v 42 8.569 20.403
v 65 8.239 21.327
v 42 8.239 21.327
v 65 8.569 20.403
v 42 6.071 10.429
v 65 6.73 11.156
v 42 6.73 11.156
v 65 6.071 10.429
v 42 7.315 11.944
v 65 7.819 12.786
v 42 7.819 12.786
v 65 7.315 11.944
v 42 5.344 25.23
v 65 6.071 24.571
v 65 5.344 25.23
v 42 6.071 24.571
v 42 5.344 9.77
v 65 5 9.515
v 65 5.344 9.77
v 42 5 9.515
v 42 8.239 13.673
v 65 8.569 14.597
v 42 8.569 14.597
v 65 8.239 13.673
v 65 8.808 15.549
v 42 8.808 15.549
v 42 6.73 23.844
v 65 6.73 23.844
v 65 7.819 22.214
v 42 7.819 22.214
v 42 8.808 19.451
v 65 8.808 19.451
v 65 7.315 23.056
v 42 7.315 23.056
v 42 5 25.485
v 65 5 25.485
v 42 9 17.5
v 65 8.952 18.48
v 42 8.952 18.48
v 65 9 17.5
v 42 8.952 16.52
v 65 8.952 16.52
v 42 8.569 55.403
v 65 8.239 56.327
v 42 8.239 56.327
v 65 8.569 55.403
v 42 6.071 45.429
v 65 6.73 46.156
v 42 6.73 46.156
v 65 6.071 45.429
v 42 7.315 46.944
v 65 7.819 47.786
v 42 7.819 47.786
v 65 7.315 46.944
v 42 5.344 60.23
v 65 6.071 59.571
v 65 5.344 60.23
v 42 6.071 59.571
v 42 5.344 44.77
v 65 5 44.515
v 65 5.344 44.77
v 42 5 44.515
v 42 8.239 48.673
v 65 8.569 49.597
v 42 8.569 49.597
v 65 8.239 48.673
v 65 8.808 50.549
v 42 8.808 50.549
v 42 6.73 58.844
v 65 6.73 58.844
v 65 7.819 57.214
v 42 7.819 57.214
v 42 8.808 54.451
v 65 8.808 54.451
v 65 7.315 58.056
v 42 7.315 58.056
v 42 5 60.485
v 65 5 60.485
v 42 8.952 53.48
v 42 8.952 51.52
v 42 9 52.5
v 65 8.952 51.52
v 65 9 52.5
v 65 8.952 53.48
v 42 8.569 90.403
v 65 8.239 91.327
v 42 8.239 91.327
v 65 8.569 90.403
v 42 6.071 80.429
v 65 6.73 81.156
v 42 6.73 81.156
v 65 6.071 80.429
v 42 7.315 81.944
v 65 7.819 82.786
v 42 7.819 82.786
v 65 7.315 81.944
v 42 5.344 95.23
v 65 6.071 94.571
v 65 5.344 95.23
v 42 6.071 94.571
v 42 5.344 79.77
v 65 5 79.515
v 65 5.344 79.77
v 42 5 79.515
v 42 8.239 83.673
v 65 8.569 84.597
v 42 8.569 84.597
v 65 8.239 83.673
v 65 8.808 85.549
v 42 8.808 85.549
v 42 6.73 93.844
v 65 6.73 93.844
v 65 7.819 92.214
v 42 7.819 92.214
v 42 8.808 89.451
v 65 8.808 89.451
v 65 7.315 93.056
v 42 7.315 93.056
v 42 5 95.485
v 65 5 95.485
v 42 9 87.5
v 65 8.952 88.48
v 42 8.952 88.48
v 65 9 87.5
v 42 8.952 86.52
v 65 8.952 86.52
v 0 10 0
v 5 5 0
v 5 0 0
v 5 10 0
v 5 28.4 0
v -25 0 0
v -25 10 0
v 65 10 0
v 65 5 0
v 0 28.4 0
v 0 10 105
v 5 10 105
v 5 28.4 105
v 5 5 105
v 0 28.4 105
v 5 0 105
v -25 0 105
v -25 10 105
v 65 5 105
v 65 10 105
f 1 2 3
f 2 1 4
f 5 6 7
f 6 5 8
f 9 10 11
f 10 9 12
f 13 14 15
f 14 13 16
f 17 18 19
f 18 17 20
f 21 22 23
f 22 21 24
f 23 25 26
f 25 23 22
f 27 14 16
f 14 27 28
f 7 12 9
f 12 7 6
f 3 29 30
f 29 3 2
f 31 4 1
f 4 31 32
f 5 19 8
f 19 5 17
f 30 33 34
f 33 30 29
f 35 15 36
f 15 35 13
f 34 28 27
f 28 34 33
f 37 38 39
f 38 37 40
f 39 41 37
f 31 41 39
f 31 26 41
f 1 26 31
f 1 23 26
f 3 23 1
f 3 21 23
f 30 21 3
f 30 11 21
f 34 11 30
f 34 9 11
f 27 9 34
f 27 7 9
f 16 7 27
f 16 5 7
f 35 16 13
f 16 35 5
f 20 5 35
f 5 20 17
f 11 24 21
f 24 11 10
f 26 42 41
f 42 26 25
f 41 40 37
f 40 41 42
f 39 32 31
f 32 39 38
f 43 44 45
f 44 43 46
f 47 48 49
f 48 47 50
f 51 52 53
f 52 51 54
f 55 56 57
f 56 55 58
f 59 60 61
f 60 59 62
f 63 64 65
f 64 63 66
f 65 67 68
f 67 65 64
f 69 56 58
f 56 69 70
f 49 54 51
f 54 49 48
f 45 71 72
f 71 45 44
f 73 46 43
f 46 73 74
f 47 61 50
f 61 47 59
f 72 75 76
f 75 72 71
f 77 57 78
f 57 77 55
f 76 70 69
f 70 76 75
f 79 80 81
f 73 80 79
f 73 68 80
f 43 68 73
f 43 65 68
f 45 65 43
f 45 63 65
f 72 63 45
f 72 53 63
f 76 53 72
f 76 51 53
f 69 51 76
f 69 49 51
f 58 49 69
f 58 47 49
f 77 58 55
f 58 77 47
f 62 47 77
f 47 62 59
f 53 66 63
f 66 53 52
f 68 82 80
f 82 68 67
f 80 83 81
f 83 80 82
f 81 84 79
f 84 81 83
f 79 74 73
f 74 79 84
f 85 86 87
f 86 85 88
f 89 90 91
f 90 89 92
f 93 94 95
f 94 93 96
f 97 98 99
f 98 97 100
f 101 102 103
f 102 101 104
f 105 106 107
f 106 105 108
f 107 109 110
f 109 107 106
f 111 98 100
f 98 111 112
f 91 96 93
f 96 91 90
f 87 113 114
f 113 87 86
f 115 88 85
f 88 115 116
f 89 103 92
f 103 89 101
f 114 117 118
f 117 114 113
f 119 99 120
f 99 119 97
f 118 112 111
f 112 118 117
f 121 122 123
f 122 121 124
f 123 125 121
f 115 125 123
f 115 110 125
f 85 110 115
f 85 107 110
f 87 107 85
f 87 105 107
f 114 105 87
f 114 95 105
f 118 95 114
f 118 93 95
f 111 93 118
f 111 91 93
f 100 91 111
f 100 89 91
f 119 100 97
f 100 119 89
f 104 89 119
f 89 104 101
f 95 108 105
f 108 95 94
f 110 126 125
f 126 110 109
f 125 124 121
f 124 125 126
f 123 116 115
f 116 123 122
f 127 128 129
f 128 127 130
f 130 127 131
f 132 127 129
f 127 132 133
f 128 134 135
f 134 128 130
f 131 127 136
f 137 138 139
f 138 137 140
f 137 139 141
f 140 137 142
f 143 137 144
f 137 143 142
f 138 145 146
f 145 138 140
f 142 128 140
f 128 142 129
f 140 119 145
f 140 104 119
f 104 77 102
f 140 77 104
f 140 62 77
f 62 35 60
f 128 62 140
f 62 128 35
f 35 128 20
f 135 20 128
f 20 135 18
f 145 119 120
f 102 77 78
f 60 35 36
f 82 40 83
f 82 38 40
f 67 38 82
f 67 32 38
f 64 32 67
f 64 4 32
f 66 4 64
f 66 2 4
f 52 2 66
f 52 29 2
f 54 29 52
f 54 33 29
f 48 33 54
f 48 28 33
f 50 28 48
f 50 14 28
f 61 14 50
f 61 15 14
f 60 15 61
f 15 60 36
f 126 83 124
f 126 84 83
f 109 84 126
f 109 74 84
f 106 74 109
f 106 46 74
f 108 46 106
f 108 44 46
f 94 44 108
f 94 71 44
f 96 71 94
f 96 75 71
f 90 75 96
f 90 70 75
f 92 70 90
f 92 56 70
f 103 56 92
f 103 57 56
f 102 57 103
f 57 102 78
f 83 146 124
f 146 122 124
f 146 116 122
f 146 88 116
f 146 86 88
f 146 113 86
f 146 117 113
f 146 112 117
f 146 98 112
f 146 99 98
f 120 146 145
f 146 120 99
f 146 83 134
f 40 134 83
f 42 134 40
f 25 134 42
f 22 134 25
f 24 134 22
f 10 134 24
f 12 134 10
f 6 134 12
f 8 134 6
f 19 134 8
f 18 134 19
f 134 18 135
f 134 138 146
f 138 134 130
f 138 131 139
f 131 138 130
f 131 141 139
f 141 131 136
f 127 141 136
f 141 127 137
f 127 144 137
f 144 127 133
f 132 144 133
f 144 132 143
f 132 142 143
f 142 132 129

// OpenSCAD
// --- Dimensions ---
shelf_thickness = 18.0;      // Thickness of the shelf (mm)
clamp_gap = 18.4;            // Gap width for the shelf (mm)
spine_width = 5.0;           // Width of the vertical spine (mm)
spine_depth = 28.4;          // Depth of the spine (mm)
bottom_jaw_width = 25.0;     // Width of the bottom jaw (mm)
bottom_jaw_depth = 5.0;       // Depth of the bottom jaw (mm)
top_jaw_width = 90.0;        // Total width of the top jaw/arm (mm)
top_jaw_depth = 5.0;         // Depth of the top jaw (mm)
arm_length = 65.0;           // Length of the arm extending forward (mm)
total_height = 105.0;        // Total extrusion length (Z-axis in print)

hole_diameter = 20.0;        // Diameter of pipette holes (mm)
hole_spacing = 35.0;         // Distance between hole centers (52.5 - 17.5)
hole_x_offset = 42.0;        // X-coordinate of hole centers
hole_z_start = 17.5;         // First hole Z-coordinate
hole_z_end = 87.5;           // Last hole Z-coordinate
hole_z_step = 35.0;          // Increment between holes

$fn = 64;

// --- Modeling ---

// The part is printed lying on its side.
// In use: +Y is up, +X is away from shelf.
// In print: XY plane is the profile, Z is the extrusion.
// Therefore: 
// Profile X -> Print X
// Profile Y -> Print Y
// Profile Z -> Print Z (extrusion)

// Wait, the prompt says: "extruded 105 mm along Z (in use, +Y is up and +X points away from the shelf)".
// This implies the profile is in the XY plane and the extrusion is along Z.
// However, the prompt also says "three round 20 mm holes go through the arm along Y (vertically in use)".
// If the holes go through the arm along Y, and the extrusion is along Z, the holes are perpendicular to the extrusion.
// Let's map the user's "In Use" coordinates to "Print" coordinates:
// In Use X -> Print X
// In Use Y -> Print Y (Vertical)
// In Use Z -> Print Z (Extrusion)
// BUT the prompt says: "three round 20 mm holes... centred at x = 42 and z = 17.5, 52.5 and 87.5".
// This means the holes are drilled through the Z-axis (the extrusion direction).
// If holes go through the arm "along Y", they are perpendicular to the extrusion.
// Let's re-read: "three round 20 mm holes go through the arm along Y (vertically in use)".
// If the holes are "along Y", the axis of the hole is Y.
// If the holes are centered at z = 17.5, 52.5, 87.5, then the holes are spaced along the Z axis.
// This means the holes are drilled through the thickness of the arm (the X-Y plane).

module profile() {
    difference() {
        // Main Body (C-shape)
        union() {
            // Spine: x [0, 5], y [0, 28.4]
            translate([0, 0])
                cube([spine_width, spine_depth]);
            
            // Bottom Jaw: x [-25, 5], y [0, 5]
            translate([-bottom_jaw_width, 0])
                cube([bottom_jaw_width + spine_width, bottom_jaw_depth]);
            
            // Top Jaw and Arm: x [-25, 65], y [23.4, 28.4]
            // Note: x = 65 is the end of the arm.
            translate([-bottom_jaw_width, top_jaw_depth])
                cube([bottom_jaw_width + arm_length, top_jaw_depth]);
        }

        // The holes: "go through the arm along Y". 
        // This means the hole axis is the Y axis.
        // The centers are at x=42 and z=17.5, 52.5, 87.5.
        // To drill through the arm (which is thin in Y), the hole must be along Y.
        // The arm is at y = 23.4 to 28.4.
        // To ensure the hole cuts through, we extend the cylinder in Y.
        for (z_pos = [hole_z_start, hole_z_start + hole_z_step, hole_z_end]) {
            translate([hole_x_offset, -1, z_pos])
                rotate([0, 90, 0])
                    cylinder(d = hole_diameter, h = spine_depth + 2);
        }
    }
}

// Final Assembly
// We extrude the profile along the Z axis.
// However, the holes are described as being at specific Z coordinates.
// This means the holes are NOT through the extrusion, but rather the extrusion 
// is the length of the part, and the holes are drilled through the "thickness" of the profile.
// If the holes are "along Y", they are perpendicular to the extrusion (Z).

// Let's re-interpret: 
// The profile is the cross-section. The part is extruded 105mm along Z.
// The holes are centered at x=42 and z=17.5, 52.5, 87.5.
// If the holes are "along Y", they are perpendicular to the Z-extrusion.
// This means the holes are drilled through the profile's Y-dimension.

// Correct approach for "extruded 105mm along Z":
// 1. Create the 2D profile.
// 2. Extrude it 105mm along Z.
// 3. Subtract holes that are oriented along the Y axis.

difference() {
    // The extruded part
    linear_extrude(height = total_height)
        profile_2d();

    // The holes: oriented along Y, centered at x=42, z=17.5, 52.5, 87.5
    for (z_pos = [hole_z_start, hole_z_start + hole_z_step, hole_z_end]) {
        translate([hole_x_offset, -1, z_pos])
            rotate([0, 90, 0])
                cylinder(d = hole_diameter, h = total_height + 2);
    }
}

// Helper module for the 2D profile
module profile_2d() {
    union() {
        // Spine
        square([spine_width, spine_depth]);
        // Bottom Jaw
        translate([-bottom_jaw_width, 0])
            square([bottom_jaw_width + spine_width, bottom_jaw_depth]);
        // Top Jaw and Arm
        translate([-bottom_jaw_width, top_jaw_depth])
            square([bottom_jaw_width + arm_length, top_jaw_depth]);
    }
}
